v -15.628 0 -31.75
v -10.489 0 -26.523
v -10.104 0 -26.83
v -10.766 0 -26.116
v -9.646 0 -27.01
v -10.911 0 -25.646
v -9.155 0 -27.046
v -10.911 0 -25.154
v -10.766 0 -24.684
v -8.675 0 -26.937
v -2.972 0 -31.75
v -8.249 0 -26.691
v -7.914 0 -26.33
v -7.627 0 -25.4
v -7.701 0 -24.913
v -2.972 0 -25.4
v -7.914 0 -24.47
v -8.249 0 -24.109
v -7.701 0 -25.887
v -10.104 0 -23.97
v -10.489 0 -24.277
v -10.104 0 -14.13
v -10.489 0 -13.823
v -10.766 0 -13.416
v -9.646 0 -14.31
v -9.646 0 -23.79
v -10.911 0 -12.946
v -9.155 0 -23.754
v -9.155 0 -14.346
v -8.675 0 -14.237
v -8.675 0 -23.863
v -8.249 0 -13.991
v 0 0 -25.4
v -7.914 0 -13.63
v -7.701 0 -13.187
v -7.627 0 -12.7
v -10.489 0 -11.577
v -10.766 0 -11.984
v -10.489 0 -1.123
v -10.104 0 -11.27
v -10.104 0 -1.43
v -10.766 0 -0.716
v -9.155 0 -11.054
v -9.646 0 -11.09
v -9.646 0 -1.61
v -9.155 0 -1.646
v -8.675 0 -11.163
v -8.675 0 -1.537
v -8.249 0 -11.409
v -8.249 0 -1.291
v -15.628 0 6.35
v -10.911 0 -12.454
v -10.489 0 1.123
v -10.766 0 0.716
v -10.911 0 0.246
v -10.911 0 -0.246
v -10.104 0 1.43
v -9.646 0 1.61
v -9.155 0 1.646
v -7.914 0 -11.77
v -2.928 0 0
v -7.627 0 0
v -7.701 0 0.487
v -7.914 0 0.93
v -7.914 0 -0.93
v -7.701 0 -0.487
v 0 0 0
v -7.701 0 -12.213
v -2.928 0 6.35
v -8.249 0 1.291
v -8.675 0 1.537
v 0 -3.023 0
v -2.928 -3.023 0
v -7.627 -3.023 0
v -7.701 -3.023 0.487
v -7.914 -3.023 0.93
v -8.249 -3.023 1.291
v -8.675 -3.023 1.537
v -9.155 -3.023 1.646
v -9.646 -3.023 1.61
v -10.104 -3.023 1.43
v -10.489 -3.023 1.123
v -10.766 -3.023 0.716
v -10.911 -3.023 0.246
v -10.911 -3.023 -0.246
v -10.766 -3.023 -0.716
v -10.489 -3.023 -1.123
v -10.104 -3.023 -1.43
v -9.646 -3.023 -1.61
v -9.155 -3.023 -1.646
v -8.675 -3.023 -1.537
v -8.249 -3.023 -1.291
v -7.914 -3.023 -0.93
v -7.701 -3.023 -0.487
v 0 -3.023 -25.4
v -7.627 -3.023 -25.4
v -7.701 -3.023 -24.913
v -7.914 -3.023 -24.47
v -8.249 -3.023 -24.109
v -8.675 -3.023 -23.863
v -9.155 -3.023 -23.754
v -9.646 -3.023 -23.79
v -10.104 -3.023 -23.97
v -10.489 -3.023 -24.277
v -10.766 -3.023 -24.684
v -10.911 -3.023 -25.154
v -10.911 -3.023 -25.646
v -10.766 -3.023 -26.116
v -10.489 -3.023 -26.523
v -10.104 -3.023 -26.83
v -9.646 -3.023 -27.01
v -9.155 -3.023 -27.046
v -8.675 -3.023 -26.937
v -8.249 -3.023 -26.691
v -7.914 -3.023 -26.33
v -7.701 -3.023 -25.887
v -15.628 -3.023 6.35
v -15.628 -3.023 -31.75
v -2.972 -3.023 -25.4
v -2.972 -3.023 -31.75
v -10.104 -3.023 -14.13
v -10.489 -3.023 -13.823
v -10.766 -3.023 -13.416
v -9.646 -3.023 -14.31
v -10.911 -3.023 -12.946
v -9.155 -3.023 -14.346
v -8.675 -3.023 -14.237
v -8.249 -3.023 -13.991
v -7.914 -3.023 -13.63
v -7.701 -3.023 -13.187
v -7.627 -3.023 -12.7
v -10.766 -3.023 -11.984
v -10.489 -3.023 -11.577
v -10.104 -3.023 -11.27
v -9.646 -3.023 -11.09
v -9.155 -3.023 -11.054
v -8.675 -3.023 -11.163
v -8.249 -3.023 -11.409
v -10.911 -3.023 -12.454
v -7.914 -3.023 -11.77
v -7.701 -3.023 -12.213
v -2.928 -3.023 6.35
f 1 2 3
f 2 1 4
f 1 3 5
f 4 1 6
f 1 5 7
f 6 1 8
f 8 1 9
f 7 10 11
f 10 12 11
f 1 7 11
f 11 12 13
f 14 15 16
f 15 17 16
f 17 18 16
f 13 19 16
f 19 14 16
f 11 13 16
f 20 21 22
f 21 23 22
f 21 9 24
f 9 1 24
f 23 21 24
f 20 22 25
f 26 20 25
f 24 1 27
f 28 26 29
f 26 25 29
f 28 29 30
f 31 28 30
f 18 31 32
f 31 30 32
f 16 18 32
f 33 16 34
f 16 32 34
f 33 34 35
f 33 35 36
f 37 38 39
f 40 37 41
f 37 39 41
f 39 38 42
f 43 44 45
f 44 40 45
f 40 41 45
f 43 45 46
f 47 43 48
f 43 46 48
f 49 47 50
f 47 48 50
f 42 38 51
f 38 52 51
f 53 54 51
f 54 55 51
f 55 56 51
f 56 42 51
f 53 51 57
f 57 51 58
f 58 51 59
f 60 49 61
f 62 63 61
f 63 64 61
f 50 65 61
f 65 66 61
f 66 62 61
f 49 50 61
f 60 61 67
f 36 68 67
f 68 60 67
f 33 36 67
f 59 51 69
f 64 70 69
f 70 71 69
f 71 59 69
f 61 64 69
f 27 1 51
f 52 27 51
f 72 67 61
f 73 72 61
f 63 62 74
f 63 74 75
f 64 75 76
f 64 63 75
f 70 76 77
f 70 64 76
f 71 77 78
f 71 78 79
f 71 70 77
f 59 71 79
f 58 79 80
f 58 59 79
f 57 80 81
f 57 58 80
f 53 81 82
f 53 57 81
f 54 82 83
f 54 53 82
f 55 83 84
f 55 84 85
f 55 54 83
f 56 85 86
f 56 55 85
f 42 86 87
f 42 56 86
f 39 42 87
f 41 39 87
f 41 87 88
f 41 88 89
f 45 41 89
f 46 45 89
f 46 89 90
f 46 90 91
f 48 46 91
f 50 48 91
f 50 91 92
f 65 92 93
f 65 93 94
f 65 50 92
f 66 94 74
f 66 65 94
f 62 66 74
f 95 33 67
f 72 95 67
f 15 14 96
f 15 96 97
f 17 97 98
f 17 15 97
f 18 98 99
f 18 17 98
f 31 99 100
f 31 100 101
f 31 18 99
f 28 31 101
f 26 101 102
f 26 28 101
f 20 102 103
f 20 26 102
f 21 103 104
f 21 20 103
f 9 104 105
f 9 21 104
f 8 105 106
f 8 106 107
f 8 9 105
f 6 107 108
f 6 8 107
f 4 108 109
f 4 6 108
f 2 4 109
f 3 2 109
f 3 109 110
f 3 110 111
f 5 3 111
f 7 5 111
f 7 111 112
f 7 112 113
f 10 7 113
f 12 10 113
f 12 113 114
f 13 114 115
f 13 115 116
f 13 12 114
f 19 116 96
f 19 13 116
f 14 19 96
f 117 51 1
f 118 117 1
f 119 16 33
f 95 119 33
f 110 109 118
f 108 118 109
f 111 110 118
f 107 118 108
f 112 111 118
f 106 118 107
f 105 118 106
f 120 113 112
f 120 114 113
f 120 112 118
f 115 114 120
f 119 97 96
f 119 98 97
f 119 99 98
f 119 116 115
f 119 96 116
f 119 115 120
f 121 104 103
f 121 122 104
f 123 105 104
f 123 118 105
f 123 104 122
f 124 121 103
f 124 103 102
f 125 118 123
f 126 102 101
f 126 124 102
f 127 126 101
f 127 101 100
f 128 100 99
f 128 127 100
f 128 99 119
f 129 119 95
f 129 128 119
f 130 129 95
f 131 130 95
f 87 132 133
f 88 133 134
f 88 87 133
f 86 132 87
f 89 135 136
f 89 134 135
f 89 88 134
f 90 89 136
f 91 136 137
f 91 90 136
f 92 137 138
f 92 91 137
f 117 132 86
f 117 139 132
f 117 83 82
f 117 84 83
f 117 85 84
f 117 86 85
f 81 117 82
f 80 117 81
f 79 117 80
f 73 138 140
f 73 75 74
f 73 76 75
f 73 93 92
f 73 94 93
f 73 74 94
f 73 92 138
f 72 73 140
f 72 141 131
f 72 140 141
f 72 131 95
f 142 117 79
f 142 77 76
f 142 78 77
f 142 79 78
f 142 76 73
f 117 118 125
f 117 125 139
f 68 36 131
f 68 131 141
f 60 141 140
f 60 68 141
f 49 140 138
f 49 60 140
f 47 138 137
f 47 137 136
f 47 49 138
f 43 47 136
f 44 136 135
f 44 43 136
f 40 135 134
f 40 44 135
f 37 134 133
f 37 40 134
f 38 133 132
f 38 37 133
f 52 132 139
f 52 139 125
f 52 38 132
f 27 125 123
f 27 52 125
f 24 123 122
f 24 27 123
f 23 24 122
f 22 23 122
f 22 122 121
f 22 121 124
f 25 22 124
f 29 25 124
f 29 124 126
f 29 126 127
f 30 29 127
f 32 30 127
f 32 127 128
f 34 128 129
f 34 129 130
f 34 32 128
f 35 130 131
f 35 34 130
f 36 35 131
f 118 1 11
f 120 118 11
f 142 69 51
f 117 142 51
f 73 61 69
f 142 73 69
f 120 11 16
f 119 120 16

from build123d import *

# Parameters (mm, degrees)
F0_R     = 1.651
F1_DEPTH = 3.0226


with BuildPart() as f1:
    # F0 (on Front) → F1 (new body)
    with BuildSketch(Plane.XZ):
        Polygon((0, -25.4), (0, 0), (-2.928276, 0), (-2.928276, 6.35), (-15.628276, 6.35), (-15.628276, -31.75), (-2.9718, -31.75), (-2.9718, -25.4), align=None)
        with Locations((-9.278276, -25.4)):
            Circle(F0_R, mode=Mode.SUBTRACT)
        with Locations((-9.278276, -12.7)):
            Circle(F0_R, mode=Mode.SUBTRACT)
        with Locations((-9.278276, 0)):
            Circle(F0_R, mode=Mode.SUBTRACT)
    extrude(amount=F1_DEPTH)


solid = f1.part
